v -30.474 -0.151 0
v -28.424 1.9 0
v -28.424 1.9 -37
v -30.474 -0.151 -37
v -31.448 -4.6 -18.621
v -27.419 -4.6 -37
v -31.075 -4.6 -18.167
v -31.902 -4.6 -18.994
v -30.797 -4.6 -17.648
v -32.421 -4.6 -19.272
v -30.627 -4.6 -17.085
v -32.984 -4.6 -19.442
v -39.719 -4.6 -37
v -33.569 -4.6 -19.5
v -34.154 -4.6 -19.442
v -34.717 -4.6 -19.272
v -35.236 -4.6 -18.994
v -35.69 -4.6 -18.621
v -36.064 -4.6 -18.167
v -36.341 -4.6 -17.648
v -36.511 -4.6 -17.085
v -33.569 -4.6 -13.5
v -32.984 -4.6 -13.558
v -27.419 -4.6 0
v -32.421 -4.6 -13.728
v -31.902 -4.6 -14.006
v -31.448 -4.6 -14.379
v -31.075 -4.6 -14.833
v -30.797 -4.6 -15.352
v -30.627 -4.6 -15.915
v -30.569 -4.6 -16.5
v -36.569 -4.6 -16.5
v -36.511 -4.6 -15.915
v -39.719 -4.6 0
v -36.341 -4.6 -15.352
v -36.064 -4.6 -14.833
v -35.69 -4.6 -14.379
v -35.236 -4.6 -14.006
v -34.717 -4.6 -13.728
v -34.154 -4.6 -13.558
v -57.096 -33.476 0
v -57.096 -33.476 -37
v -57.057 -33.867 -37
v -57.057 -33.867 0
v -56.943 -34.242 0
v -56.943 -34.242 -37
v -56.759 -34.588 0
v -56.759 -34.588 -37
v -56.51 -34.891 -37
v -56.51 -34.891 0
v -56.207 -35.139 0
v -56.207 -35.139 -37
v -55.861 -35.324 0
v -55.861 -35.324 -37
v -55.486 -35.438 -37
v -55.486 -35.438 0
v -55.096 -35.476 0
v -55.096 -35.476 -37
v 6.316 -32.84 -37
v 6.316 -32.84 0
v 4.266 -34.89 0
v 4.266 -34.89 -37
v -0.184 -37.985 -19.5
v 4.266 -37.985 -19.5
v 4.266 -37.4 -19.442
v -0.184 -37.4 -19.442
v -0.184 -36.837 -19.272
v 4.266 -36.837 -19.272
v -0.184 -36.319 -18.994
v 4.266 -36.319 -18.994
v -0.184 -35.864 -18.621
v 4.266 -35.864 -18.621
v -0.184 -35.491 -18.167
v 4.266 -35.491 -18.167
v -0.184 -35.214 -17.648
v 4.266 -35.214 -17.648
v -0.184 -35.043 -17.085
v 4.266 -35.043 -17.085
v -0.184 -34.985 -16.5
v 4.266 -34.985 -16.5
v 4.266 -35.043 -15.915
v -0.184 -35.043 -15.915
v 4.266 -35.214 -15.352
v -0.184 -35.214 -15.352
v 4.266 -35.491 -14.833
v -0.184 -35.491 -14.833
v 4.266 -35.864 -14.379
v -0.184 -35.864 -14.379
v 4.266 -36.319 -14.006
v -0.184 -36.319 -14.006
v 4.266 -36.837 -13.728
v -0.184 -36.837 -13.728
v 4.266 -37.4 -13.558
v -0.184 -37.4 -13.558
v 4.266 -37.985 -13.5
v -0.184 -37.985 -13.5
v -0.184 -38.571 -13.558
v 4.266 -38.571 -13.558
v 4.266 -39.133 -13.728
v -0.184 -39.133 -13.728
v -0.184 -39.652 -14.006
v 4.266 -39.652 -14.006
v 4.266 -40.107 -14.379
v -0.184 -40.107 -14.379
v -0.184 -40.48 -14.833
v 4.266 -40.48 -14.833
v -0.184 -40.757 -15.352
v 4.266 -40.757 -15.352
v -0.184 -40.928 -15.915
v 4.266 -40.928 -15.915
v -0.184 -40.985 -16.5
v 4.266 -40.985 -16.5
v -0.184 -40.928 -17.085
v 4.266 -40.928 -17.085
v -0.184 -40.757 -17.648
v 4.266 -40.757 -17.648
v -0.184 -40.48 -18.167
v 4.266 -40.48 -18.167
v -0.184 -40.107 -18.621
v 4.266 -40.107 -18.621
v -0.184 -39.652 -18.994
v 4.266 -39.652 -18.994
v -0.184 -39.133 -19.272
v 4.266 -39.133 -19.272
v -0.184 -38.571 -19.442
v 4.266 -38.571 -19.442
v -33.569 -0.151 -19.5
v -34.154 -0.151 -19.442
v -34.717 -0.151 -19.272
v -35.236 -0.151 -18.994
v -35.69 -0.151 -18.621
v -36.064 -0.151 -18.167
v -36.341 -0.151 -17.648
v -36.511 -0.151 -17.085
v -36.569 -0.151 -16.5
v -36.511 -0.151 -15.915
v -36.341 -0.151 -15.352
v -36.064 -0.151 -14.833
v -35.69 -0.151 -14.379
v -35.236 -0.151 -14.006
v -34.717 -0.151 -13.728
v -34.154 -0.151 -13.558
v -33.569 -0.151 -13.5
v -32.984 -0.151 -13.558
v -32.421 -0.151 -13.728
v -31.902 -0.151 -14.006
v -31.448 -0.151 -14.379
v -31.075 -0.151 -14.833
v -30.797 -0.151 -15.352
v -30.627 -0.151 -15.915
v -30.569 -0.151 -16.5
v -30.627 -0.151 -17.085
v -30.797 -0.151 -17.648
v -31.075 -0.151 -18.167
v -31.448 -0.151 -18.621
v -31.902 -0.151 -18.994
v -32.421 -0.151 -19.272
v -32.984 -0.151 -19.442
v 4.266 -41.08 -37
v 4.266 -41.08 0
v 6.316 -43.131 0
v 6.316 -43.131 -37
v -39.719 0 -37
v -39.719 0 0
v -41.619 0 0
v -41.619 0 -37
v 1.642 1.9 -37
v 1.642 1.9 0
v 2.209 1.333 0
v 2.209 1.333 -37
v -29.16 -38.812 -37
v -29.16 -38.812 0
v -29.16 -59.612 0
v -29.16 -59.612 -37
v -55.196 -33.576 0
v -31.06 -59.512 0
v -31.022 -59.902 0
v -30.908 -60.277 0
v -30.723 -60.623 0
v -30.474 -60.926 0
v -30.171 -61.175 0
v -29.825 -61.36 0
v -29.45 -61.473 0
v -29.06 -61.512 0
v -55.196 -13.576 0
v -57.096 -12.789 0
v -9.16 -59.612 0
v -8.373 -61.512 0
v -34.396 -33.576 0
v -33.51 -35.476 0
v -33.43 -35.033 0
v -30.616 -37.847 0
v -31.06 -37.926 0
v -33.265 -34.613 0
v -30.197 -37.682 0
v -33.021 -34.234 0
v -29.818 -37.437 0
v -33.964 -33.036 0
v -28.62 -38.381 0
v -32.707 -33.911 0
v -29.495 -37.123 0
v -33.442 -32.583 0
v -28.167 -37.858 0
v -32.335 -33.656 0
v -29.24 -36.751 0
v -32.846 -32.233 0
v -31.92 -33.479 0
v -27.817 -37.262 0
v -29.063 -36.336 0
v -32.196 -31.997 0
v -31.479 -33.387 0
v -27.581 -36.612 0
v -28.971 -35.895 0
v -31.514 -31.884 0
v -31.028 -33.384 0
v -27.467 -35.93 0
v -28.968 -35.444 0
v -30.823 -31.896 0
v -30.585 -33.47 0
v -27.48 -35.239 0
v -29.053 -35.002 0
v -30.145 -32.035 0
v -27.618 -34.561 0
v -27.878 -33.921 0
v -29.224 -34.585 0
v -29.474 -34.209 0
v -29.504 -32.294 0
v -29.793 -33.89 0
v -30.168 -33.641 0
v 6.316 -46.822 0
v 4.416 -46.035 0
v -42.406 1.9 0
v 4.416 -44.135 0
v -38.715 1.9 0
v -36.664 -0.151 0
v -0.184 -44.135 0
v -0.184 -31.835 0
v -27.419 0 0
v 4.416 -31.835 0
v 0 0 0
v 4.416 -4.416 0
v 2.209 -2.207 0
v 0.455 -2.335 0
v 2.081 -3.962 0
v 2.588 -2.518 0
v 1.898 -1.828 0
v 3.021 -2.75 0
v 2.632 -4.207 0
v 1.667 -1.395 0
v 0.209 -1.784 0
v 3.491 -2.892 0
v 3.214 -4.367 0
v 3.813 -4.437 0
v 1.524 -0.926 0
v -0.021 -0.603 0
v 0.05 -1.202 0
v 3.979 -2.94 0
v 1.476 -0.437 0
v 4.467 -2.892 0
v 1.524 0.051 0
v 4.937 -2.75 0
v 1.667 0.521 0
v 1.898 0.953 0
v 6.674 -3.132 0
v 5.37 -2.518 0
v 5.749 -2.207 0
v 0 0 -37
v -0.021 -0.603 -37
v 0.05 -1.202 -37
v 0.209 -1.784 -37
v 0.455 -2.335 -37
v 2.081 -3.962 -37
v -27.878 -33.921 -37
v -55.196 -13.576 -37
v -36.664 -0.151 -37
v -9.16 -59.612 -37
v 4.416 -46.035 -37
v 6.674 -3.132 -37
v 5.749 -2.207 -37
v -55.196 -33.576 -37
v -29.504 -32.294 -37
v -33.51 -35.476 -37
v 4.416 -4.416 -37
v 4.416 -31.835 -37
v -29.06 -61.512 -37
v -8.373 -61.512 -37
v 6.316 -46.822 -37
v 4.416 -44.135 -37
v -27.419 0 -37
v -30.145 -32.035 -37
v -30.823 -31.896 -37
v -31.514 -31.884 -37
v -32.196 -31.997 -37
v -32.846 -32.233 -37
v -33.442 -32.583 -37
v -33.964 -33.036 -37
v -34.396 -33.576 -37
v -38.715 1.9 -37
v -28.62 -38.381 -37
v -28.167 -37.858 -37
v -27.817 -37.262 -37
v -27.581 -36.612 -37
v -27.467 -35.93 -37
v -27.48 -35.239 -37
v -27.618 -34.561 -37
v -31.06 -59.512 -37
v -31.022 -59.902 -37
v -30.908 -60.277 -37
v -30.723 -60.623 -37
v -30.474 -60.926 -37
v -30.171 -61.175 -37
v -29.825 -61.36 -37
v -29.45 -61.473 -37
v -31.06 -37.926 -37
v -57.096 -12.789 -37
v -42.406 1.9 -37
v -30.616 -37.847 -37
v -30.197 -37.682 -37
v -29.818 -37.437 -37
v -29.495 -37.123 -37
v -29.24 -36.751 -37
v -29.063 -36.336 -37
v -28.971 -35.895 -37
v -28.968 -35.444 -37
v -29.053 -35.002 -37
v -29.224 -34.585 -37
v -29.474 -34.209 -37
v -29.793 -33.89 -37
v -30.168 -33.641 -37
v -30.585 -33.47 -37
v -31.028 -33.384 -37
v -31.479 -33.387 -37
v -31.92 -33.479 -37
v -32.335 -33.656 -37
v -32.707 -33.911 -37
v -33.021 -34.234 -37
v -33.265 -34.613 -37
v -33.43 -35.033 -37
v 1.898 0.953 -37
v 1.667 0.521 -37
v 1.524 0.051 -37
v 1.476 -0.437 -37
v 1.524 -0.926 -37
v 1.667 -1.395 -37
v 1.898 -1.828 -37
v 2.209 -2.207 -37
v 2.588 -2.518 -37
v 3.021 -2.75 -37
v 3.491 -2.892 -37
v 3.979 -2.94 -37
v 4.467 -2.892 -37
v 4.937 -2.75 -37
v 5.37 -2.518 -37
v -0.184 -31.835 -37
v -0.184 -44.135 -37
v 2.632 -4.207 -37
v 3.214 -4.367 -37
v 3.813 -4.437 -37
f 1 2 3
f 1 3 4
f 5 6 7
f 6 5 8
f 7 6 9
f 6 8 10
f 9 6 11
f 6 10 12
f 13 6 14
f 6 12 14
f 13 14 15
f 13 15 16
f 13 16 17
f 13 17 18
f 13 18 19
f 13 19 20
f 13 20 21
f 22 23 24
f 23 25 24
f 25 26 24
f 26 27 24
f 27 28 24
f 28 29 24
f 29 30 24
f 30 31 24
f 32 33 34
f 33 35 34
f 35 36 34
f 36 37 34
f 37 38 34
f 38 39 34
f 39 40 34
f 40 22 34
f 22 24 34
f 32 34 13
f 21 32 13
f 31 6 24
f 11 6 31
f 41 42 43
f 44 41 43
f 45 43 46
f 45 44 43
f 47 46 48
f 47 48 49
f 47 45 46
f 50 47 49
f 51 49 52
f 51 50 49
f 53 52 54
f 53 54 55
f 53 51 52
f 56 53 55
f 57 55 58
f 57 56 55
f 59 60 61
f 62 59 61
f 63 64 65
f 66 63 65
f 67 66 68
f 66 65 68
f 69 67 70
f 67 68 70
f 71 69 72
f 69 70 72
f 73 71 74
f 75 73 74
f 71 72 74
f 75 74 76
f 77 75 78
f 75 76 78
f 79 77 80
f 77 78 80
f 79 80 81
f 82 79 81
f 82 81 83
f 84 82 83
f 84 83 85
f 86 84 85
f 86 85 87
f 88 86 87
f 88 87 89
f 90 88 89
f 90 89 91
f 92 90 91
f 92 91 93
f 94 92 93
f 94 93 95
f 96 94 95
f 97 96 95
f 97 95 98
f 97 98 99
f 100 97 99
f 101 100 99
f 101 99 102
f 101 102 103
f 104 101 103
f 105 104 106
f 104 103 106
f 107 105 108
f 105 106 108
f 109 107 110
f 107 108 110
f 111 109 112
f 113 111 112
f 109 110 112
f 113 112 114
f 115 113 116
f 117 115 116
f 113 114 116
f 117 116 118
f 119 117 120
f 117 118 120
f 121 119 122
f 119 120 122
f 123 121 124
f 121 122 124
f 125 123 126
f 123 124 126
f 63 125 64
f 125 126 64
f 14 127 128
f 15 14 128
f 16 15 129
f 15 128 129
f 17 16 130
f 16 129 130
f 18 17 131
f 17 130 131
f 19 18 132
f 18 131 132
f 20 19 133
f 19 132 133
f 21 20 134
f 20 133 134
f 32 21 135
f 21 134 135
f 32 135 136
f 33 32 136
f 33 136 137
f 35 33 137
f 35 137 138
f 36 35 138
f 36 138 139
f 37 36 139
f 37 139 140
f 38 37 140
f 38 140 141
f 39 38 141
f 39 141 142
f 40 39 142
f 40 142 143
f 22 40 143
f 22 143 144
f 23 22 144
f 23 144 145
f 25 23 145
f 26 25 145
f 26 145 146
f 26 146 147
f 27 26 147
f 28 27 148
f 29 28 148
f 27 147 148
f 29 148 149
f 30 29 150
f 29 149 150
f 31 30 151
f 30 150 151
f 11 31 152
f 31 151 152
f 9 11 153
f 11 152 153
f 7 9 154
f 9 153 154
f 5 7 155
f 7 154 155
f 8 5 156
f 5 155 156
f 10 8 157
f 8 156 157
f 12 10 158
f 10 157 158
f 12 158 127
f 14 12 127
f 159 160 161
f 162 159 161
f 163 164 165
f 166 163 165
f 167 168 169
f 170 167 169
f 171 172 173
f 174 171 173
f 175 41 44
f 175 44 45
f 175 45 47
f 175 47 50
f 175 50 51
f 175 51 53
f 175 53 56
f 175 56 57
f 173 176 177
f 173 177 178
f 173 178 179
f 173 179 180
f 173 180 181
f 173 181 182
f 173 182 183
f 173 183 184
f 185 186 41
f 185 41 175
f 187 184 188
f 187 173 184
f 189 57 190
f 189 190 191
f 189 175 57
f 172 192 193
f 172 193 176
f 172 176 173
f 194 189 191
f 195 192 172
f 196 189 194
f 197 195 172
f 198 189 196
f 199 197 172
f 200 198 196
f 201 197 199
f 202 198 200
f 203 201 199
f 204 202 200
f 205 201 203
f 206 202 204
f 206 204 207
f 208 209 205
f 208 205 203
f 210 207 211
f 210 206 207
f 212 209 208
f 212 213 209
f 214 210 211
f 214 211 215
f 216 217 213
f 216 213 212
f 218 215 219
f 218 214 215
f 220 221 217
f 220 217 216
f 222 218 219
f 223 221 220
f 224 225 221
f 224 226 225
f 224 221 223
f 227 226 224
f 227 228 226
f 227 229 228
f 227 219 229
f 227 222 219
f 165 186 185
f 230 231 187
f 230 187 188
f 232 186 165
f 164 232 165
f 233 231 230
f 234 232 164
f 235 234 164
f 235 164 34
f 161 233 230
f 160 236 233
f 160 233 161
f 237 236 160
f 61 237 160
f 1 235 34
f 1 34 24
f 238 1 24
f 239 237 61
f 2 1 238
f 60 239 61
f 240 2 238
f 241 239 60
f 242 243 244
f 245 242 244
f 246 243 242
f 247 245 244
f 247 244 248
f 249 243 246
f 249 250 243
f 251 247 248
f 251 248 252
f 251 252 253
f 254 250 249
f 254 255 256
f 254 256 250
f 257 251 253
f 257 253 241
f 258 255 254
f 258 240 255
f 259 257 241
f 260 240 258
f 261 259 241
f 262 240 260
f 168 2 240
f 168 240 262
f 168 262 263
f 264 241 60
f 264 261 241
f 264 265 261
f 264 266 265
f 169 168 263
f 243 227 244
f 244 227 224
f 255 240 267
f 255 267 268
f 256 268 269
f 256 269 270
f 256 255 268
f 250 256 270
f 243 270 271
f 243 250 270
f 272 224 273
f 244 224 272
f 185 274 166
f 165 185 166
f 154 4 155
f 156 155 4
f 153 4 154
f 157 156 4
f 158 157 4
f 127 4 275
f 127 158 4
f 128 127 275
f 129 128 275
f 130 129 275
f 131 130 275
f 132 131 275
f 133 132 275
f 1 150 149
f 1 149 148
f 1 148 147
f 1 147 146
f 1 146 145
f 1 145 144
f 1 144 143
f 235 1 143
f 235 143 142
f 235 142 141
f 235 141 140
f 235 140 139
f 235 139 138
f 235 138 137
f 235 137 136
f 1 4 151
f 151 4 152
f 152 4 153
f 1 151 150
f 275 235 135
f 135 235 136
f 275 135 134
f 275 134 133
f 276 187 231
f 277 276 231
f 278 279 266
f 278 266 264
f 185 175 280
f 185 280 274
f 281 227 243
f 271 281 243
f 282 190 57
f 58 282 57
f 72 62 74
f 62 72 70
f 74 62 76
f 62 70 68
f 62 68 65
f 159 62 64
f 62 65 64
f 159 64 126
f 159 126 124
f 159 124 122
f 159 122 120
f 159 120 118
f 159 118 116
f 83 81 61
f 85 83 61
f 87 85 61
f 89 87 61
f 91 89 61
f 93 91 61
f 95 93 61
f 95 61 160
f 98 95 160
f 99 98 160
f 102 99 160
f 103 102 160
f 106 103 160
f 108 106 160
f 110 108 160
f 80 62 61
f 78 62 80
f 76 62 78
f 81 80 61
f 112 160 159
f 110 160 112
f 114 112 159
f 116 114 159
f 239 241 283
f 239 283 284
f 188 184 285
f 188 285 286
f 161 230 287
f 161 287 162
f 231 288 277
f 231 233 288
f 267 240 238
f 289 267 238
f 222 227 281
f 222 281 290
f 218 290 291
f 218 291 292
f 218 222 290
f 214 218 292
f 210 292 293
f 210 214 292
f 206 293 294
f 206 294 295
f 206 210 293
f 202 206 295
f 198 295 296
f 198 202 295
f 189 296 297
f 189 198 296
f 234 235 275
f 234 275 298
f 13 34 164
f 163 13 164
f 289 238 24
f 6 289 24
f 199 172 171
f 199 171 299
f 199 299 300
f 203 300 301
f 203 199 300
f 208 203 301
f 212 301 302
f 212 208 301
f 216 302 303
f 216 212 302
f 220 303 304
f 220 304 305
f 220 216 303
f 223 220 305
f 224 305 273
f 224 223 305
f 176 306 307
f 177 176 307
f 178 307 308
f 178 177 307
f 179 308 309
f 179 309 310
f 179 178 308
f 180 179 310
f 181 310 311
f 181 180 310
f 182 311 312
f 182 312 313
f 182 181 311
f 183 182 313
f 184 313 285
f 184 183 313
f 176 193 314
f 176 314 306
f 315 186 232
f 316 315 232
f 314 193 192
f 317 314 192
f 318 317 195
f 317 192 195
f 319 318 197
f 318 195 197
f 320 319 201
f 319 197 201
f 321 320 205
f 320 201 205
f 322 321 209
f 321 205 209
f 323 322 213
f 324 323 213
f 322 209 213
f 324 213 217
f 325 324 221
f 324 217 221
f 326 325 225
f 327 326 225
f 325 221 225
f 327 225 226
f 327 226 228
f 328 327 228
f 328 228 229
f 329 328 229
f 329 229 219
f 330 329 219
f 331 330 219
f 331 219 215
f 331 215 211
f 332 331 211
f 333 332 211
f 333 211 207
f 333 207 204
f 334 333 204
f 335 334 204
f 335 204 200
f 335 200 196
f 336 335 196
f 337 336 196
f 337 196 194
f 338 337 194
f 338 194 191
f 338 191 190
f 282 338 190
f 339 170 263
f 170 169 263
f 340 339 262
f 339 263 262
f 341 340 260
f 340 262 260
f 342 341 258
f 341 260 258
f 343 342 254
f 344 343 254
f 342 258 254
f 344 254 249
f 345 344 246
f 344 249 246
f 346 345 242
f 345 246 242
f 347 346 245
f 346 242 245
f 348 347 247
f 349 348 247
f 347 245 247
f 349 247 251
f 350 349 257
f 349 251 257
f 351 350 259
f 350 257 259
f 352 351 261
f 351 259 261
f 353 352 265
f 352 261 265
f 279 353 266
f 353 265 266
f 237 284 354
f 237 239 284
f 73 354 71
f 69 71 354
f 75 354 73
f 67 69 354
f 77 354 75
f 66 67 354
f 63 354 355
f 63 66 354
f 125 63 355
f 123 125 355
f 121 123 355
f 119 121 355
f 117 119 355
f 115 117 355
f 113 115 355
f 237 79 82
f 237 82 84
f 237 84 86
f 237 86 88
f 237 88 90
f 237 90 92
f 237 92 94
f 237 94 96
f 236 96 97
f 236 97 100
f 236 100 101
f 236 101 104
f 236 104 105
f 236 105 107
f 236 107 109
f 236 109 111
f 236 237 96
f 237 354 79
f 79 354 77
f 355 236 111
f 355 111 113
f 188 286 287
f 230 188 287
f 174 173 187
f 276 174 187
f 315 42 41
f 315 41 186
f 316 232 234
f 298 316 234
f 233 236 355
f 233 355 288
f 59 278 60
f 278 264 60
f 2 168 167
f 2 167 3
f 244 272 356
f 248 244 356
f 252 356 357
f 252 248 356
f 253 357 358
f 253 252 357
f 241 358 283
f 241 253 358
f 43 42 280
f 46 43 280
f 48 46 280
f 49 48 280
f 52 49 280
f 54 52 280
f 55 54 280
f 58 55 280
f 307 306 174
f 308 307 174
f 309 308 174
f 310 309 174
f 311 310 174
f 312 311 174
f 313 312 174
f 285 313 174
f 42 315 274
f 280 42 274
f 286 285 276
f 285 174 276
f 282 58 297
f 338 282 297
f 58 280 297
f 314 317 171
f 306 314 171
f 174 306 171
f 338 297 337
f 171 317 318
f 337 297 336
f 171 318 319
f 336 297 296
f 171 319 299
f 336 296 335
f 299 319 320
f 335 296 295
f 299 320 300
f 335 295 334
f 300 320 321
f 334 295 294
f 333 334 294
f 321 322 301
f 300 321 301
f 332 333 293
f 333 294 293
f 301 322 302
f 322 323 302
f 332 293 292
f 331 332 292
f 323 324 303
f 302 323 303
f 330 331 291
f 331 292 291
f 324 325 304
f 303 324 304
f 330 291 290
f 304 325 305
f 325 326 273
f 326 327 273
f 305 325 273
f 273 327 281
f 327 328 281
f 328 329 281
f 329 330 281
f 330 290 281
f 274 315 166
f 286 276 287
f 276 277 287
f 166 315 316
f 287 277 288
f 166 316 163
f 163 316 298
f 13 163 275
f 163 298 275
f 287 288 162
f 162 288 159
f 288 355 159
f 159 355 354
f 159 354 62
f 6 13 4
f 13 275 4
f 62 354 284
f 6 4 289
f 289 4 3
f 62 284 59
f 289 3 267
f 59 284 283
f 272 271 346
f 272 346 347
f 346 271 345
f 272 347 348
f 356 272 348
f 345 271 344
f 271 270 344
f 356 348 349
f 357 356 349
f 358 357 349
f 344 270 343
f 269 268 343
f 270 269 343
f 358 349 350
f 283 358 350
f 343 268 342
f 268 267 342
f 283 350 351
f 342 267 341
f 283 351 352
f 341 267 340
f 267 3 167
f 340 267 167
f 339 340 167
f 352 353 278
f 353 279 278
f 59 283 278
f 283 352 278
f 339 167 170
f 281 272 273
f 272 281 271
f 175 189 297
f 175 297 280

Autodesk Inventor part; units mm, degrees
sketch "Sketch1" plane through (0, 0, 0) normal (0, 0, 1) x (1, 0, 0)
  line L0 (0, 0) -> (-27.4191, 0)
  line L1 (-27.4191, 0) -> (-27.4191, -4.6)
  line L2 (-27.4191, -4.6) -> (-39.7191, -4.6)
  line L3 (-39.7191, -4.6) -> (-39.7191, 0)
  line L4 (-39.7191, 0) -> (-41.6191, 0)
  line L5 (-55.1956, -13.5765) -> (-41.6191, 0)
  line L6 (-55.1956, -33.5765) -> (-55.1956, -13.5765)
  line L7 (-34.3956, -33.5765) -> (-55.1956, -33.5765)
  line L8 (1.6418, 1.9) -> (-28.4235, 1.9)
  line L9 (-28.4235, 1.9) -> (-30.4741, -0.1506)
  line L10 (-30.4741, -0.1506) -> (-36.6641, -0.1506)
  line L11 (-36.6641, -0.1506) -> (-38.7147, 1.9)
  line L12 (-42.4061, 1.9) -> (-38.7147, 1.9)
  line L13 (-57.3968, -13.0907) -> (-42.4061, 1.9)
  line L14 (-57.0956, -33.4765) -> (-57.0956, -12.7894)
  line L15 (-33.5097, -35.4765) -> (-55.0956, -35.4765)
  arc A0 (-57.0956, -33.4765) -> (-55.0956, -35.4765) centre (-55.0956, -33.4765) ccw
  line L16 (-29.5043, -32.2942) -> (0.4547, -2.3353)
  line L17 (8.0118, 3.5954) -> (-35.5125, -39.9288) construction
  line L18 (4.4163, -4.4163) -> (4.4163, -31.8354)
  line L19 (4.4163, -31.8354) -> (-0.1837, -31.8354)
  line L20 (-0.1837, -31.8354) -> (-0.1837, -44.1354)
  line L21 (-0.1837, -44.1354) -> (4.4163, -44.1354)
  line L22 (4.4163, -44.1354) -> (4.4163, -46.0354)
  line L23 (-9.1601, -59.6119) -> (4.4163, -46.0354)
  line L24 (-29.1601, -59.6119) -> (-9.1601, -59.6119)
  line L25 (-29.1601, -38.8119) -> (-29.1601, -59.6119)
  line L26 (6.6743, -3.1325) -> (6.3163, -32.8398)
  line L27 (6.3163, -32.8398) -> (4.2657, -34.8904)
  line L28 (4.2657, -34.8904) -> (4.2657, -41.0804)
  line L29 (4.2657, -41.0804) -> (6.3163, -43.131)
  line L30 (6.3163, -46.8224) -> (6.3163, -43.131)
  line L31 (-8.6743, -61.8131) -> (6.3163, -46.8224)
  line L32 (-29.0601, -61.5119) -> (-8.3731, -61.5119)
  line L33 (-31.0601, -37.926) -> (-31.0601, -59.5119)
  arc A1 (-31.0601, -59.5119) -> (-29.0601, -61.5119) centre (-29.0601, -59.5119) ccw
  line L34 (-27.8779, -33.9206) -> (2.081, -3.9617)
  arc A2 (-29.1601, -38.8119) -> (-27.8779, -33.9206) centre (-31.2373, -35.6537) ccw
  arc A3 (-29.5043, -32.2942) -> (-34.3956, -33.5765) centre (-31.2373, -35.6537) ccw
  arc A4 (2.081, -3.9617) -> (4.4163, -4.4163) centre (3.9791, -0.4372) ccw
  arc A5 (0, 0) -> (0.4547, -2.3353) centre (3.9791, -0.4372) ccw
  arc A6 (2.2092, 1.3327) -> (5.749, -2.2072) centre (3.9791, -0.4372) ccw
  arc A7 (-31.0601, -37.926) -> (-33.5097, -35.4765) centre (-31.2373, -35.6537) ccw
  line L35 (1.6418, 1.9) -> (2.2092, 1.3327)
  line L36 (5.749, -2.2072) -> (6.6743, -3.1325)
  point P0 (0, 0)
  point P1 (-57.0956, -35.4765)
  point P2 (-13.7504, -18.1667)
  point P3 (-31.0601, -61.5119)
  point P4 (-29.6257, -34.042)
  dimension "d1" = 4.6
  dimension "d2" = 12.3
  dimension "d3" = 1.9
  dimension "d4" = 135
  dimension "d5" = 19.2
  dimension "d6" = 20
  dimension "d7" = 20.8
  dimension "d10" = 1.9
  dimension "d11" = 2.9
  dimension "d12" = 2.9
  dimension "d14" = 6.19
  dimension "d15" = 3.055
  dimension "d17" = 135
  dimension "d18" = 135
  dimension "d20" = 21.2
  dimension "d22" = 1.9
  dimension "d23" = 1.9
  dimension "d24" = 1.9
  dimension "d25" = 22.687
  dimension "d27" = 2
  dimension "d33" = 2.3
  dimension "d34" = 90
  dimension "d45" = 1.5
  dimension "d46" = 1.5009
extrude "Extrusion1" add sketch "Sketch1" against normal blind 37
ref_plane "Work Plane1" through (4.2657, -41.0804, 0) normal (1, 0, 0) x (0, 0, -1)
sketch "Sketch2" plane through (4.2657, -41.0804, 0) normal (1, 0, 0) x (0, 0, -1)
  circle A0 centre (16.5, 3.095) radius 3
  line L0 (0, 0) -> (0, 6.19) projected
  line L1 (0, 0) -> (37, 0) projected
  point P0 (0, 41.0804)
  dimension "d52" = 6
  dimension "d53" = 16.5
  dimension "d55" = 3.095
extrude "Extrusion2" cut sketch "Sketch2" against normal blind 10
thread "Thread1" size "M6x1" class "6H" standard "ANSI Metric M Profile" full length
ref_plane "Work Plane2" through (-28.6911, -33.1074, 0) normal (0.7071, -0.7071, 0) x (-0.7071, -0.7071, 0)
mirror "Mirror1" about plane through (-28.6911, -33.1074, 0) normal (0.7071, -0.7071, 0) of "Extrusion2"
ref_plane "Plano de trabajo3" through (0, 0, -18.5) normal (0, 0, 1) x (1, 0, 0)
properties part number "ESCUADRA UNIÓN 45 GORDA"
